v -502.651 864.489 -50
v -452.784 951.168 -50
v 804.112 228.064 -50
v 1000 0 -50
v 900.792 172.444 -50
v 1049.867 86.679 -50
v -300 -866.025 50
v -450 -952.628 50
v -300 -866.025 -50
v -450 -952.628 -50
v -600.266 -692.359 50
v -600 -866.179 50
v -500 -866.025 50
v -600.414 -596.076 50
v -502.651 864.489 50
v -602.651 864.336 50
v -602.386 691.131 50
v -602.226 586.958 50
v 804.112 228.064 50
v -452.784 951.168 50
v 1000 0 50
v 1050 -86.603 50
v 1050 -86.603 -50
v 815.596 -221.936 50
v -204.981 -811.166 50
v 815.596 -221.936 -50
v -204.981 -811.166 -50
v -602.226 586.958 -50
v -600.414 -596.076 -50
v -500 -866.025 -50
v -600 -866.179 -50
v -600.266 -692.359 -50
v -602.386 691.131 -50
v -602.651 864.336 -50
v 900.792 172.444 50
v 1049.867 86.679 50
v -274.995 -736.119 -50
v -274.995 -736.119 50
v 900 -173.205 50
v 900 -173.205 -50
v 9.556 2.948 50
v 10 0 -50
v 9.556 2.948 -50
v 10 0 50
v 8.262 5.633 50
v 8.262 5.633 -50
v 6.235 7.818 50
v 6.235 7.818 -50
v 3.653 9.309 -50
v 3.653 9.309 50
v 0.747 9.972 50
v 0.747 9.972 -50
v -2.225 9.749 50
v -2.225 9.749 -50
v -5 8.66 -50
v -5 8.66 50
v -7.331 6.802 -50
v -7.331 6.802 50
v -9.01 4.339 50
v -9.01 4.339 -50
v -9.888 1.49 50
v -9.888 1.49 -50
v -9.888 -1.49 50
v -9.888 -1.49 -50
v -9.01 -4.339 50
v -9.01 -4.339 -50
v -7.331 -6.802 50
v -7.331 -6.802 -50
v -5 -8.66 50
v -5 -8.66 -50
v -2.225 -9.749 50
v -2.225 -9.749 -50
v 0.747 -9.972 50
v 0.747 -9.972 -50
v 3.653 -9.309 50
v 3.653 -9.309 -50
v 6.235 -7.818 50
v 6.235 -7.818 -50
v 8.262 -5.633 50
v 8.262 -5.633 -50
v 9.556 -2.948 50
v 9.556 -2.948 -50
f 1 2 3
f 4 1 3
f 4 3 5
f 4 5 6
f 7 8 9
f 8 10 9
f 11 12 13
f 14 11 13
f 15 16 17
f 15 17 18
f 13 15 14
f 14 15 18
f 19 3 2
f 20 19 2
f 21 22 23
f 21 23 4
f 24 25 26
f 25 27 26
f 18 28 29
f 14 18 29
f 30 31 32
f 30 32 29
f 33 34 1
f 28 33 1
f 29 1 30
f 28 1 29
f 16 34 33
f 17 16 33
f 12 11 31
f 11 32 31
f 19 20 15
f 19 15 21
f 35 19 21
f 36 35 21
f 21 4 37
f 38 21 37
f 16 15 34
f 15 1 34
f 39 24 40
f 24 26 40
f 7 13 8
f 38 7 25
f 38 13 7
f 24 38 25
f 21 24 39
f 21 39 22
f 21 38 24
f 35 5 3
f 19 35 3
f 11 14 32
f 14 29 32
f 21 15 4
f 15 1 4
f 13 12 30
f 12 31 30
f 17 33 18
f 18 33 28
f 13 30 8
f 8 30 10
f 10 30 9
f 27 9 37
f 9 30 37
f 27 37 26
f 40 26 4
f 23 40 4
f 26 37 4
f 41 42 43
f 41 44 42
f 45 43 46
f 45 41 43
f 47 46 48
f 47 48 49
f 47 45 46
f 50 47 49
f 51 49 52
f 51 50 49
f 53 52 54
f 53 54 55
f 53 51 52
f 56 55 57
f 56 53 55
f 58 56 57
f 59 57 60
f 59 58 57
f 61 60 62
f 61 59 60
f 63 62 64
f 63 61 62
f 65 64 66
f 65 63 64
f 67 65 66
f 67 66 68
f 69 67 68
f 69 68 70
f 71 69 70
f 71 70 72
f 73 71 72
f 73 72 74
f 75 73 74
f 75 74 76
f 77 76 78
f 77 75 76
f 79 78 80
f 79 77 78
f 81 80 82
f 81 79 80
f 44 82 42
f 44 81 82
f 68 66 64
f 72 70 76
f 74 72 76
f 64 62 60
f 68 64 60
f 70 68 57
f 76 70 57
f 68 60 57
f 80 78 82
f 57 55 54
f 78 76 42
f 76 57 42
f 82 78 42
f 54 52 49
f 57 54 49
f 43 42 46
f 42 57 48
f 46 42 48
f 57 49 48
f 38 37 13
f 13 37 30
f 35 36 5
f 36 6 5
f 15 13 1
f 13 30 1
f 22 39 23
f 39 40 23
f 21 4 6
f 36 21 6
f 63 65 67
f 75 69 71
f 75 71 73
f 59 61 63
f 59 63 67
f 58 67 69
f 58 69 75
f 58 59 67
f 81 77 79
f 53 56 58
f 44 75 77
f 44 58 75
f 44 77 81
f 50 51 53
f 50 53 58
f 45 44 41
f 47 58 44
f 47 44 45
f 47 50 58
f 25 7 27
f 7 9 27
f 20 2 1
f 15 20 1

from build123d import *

# Parameters (mm, degrees)
SKETCH1_R           = 10
BOSS_EXTRUDE1_DEPTH = 50


with BuildPart() as part:
    # Sketch1 → Boss-Extrude1 (new, symmetric)
    with BuildSketch(Plane.XY):
        Polygon((-585.007153272, 557.133458435), (-602.226330597, 586.957948427), (-600.41372537, -596.075731726), (-579.69958337, -560.197785347), (-500.398429433, -605.982327919), (-502.253720562, 604.911175087), align=None)
        Polygon((-502.65143742, 864.489174287), (-602.385941237, 691.131080307), (-602.226330597, 586.957948427), (-585.007153272, 557.133458435), (-502.253720562, 604.911175087), align=None)
        Polygon((-602.651320044, 864.335957761), (-602.385941237, 691.131080307), (-502.65143742, 864.489174287), align=None)
        Polygon((-195.295721569, 782.133458435), (-277.253016301, 734.81539226), (774.99530494, 129.447267809), (774.99530494, 228.064326912), (804.111954534, 228.064326912), (-213.363096355, 813.427069525), align=None)
        Polygon((-302.119031537, 864.489174287), (-502.65143742, 864.489174287), (-277.253016301, 734.81539226), (-195.295721569, 782.133458435), (-213.363096355, 813.427069525), align=None)
        Polygon((-452.784185512, 951.168221277), (-502.65143742, 864.489174287), (-302.119031537, 864.489174287), align=None)
        Polygon((1000, 0), (774.99530494, -129.906521262), (774.99530494, -221.935673088), (815.596138199, -221.935673088), (900, -173.205080757), align=None)
        Polygon((1050, -86.602540378), (1000, 0), (900, -173.205080757), align=None)
        Polygon((774.99530494, 228.064326912), (774.99530494, 129.447267809), (1000, 0), (900.791585986, 172.443646903), (804.111954534, 228.064326912), align=None)
        Polygon((900.791585986, 172.443646903), (1000, 0), (1049.867251908, 86.67904699), align=None)
        Polygon((774.99530494, -129.906521262), (-274.995304939, -736.118882522), (-189.988151667, -785.197785347), (-204.980998395, -811.16615763), (815.596138199, -221.935673088), (774.99530494, -221.935673088), align=None)
        Polygon((-274.995304939, -736.118882522), (-500, -866.025403784), (-300, -866.025403784), (-204.980998395, -811.16615763), (-189.988151667, -785.197785347), align=None)
        Polygon((-300, -866.025403784), (-500, -866.025403784), (-450, -952.627944163), align=None)
        Polygon((-600.41372537, -596.075731726), (-600.266202942, -692.359246007), (-500, -866.025403784), (-500.398429433, -605.982327919), (-579.69958337, -560.197785347), align=None)
        Polygon((-500, -866.025403784), (-600.266202942, -692.359246007), (-599.999882623, -866.17862031), align=None)
        Circle(SKETCH1_R)
    extrude(amount=BOSS_EXTRUDE1_DEPTH, both=True)


solid = part.part
